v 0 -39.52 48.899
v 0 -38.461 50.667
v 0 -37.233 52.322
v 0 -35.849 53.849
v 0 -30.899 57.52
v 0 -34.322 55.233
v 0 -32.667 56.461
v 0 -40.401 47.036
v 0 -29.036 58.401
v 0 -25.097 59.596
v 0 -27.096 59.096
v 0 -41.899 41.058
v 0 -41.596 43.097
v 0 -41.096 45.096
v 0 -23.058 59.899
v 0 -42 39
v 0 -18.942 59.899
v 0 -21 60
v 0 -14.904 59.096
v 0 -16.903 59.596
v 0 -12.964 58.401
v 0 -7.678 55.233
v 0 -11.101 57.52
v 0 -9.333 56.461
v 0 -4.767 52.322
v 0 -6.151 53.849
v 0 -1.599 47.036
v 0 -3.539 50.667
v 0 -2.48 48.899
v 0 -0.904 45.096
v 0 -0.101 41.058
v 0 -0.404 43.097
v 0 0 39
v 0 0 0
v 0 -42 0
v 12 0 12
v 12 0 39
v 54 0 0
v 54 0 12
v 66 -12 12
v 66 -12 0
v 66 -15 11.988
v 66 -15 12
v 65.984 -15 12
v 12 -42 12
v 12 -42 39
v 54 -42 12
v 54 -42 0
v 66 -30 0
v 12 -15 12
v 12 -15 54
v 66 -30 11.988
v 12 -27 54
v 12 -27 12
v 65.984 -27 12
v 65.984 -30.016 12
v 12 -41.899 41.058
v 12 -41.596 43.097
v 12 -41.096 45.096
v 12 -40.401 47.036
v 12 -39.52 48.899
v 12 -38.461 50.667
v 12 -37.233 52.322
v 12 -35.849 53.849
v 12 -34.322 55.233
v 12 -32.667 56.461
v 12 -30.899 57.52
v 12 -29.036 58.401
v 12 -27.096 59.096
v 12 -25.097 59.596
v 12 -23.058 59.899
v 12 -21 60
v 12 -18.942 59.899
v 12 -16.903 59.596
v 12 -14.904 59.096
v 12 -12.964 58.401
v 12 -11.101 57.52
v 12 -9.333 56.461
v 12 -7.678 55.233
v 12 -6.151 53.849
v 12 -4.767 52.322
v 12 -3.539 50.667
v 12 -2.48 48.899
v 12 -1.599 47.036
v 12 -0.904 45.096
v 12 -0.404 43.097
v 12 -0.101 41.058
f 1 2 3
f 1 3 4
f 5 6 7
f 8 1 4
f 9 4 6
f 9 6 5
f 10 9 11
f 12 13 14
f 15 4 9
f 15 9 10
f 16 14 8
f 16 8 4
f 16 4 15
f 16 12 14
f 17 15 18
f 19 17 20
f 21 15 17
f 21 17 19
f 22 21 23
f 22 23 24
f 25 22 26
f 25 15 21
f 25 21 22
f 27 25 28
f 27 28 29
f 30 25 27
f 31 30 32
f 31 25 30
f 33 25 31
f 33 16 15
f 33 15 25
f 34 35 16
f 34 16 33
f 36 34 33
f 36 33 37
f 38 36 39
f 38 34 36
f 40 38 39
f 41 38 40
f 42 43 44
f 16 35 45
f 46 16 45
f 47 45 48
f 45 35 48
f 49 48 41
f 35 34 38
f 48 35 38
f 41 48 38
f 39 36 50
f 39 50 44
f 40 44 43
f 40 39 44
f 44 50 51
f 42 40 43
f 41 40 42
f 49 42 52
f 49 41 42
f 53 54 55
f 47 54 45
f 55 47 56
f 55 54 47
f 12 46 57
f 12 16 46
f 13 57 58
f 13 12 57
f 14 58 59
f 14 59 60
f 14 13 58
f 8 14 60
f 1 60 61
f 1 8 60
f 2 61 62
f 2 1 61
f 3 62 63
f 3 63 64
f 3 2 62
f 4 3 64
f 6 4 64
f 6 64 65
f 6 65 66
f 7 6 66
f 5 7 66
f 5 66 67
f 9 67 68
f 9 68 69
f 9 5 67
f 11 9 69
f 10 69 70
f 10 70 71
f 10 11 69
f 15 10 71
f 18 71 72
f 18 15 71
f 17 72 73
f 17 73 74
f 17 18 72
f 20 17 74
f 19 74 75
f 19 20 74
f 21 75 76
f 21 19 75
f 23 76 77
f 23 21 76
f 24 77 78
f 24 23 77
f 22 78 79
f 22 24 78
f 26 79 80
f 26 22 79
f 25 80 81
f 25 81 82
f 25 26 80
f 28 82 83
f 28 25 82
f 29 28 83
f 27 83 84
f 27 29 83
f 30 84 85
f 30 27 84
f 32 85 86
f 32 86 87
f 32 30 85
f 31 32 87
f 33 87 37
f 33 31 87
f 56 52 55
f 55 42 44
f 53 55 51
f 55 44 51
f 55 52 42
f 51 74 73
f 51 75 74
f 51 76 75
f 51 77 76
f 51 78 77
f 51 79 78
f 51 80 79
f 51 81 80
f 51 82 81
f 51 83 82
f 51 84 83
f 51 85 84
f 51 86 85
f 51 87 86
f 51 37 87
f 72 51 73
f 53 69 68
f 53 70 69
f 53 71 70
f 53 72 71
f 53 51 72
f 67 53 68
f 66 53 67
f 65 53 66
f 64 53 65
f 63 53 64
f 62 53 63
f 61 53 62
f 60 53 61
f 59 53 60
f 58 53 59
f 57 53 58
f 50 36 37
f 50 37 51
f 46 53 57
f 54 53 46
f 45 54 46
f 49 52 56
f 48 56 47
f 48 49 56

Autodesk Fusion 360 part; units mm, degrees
sketch "Sketch1" plane through (0, 0, 0) normal (0, 0, 1) x (1, 0, 0)
  line L0 (0, 0) -> (66, 0) construction
  line L1 (66, 0) -> (66, -42) construction
  line L2 (66, -42) -> (0, -42) construction
  line L3 (0, -42) -> (0, 0)
  line L4 (66, 0) -> (54, 0) construction
  line L5 (54, 0) -> (54, -12) construction
  line L6 (54, -12) -> (66, -12) construction
  line L7 (66, -12) -> (66, 0) construction
  line L8 (66, -42) -> (54, -42) construction
  line L9 (54, -42) -> (54, -30) construction
  line L10 (54, -30) -> (66, -30) construction
  line L11 (66, -30) -> (66, -42) construction
  line L12 (54, 0) -> (66, -12)
  line L13 (66, -30) -> (54, -42)
  line L14 (0, -42) -> (54, -42)
  line L15 (0, 0) -> (54, 0)
  line L16 (66, -12) -> (66, -30)
  line L17 (0, 0) -> (12, 0)
  line L18 (12, 0) -> (12, -42)
  line L19 (12, -42) -> (0, -42)
  line L20 (0, -42) -> (0, 0)
  line L21 (66, -21) -> (12, -21)
  line L22 (12, -21) -> (12, -15)
  line L23 (12, -21) -> (12, -27)
  line L24 (12, -27) -> (66, -27)
  line L25 (12, -15) -> (66, -15)
  dimension "d1" = 66
  dimension "d2" = 42
  dimension "d3" = 12
  dimension "d4" = 12
  dimension "d5" = 12
  dimension "d6" = 12
  dimension "d7" = 42
  dimension "d8" = 12
  dimension "d9" = 6
  dimension "d10" = 6
extrude "Extrude1" add sketch "Sketch1" along normal blind 60 contours L3 L14 L15 L17 L18 L19 L20 L22 L23 makes body 1
extrude "Extrude2" add sketch "Sketch1" along normal blind 12 contours L13 L14 L16 L18 L24 | L12 L15 L16 L18 L25 | L16 L18 L21 L23 L24 | L16 L18 L21 L22 L25 bodies 1
sketch "Sketch2" plane through (0, 0, 0) normal (-1, 0, 0) x (0, -1, 0)
  line L0 (0, 0) -> (42, 0)
  line L1 (42, 0) -> (42, 60)
  line L2 (42, 60) -> (0, 60)
  line L3 (0, 60) -> (0, 0)
  line L4 (0, 60) -> (42, 60)
  line L5 (42, 60) -> (42, 0)
  line L6 (42, 0) -> (0, 0)
  line L7 (0, 0) -> (0, 60)
  circle A0 centre (21, 39) radius 21
  dimension "d15" = 42
extrude "Extrude3" cut sketch "Sketch2" against normal blind 15 contours L2 L3 L4 L7 A0 | L1 L2 L4 L5 A0 bodies 1
extrude "Extrude4" add sketch "Sketch1" along normal blind 54 separate body contours L16 L18 L21 L23 L24 | L16 L18 L21 L22 L25 makes body 2
sketch "Sketch3" plane through (0, -15, 0) normal (0, 1, 0) x (-1, 0, 0)
  line L0 (-66, 0) -> (-12, 0)
  line L1 (-12, 0) -> (-12, 54)
  line L2 (-12, 54) -> (-66, 54)
  line L3 (-66, 54) -> (-66, 0)
  line L4 (-66, 11.9878) -> (-12, 54)
extrude "Extrude5" cut sketch "Sketch3" against normal blind 25 contours L2 L3 L4 bodies 1 2
combine "Combine1" operation add target body 1 tool bodies 2
